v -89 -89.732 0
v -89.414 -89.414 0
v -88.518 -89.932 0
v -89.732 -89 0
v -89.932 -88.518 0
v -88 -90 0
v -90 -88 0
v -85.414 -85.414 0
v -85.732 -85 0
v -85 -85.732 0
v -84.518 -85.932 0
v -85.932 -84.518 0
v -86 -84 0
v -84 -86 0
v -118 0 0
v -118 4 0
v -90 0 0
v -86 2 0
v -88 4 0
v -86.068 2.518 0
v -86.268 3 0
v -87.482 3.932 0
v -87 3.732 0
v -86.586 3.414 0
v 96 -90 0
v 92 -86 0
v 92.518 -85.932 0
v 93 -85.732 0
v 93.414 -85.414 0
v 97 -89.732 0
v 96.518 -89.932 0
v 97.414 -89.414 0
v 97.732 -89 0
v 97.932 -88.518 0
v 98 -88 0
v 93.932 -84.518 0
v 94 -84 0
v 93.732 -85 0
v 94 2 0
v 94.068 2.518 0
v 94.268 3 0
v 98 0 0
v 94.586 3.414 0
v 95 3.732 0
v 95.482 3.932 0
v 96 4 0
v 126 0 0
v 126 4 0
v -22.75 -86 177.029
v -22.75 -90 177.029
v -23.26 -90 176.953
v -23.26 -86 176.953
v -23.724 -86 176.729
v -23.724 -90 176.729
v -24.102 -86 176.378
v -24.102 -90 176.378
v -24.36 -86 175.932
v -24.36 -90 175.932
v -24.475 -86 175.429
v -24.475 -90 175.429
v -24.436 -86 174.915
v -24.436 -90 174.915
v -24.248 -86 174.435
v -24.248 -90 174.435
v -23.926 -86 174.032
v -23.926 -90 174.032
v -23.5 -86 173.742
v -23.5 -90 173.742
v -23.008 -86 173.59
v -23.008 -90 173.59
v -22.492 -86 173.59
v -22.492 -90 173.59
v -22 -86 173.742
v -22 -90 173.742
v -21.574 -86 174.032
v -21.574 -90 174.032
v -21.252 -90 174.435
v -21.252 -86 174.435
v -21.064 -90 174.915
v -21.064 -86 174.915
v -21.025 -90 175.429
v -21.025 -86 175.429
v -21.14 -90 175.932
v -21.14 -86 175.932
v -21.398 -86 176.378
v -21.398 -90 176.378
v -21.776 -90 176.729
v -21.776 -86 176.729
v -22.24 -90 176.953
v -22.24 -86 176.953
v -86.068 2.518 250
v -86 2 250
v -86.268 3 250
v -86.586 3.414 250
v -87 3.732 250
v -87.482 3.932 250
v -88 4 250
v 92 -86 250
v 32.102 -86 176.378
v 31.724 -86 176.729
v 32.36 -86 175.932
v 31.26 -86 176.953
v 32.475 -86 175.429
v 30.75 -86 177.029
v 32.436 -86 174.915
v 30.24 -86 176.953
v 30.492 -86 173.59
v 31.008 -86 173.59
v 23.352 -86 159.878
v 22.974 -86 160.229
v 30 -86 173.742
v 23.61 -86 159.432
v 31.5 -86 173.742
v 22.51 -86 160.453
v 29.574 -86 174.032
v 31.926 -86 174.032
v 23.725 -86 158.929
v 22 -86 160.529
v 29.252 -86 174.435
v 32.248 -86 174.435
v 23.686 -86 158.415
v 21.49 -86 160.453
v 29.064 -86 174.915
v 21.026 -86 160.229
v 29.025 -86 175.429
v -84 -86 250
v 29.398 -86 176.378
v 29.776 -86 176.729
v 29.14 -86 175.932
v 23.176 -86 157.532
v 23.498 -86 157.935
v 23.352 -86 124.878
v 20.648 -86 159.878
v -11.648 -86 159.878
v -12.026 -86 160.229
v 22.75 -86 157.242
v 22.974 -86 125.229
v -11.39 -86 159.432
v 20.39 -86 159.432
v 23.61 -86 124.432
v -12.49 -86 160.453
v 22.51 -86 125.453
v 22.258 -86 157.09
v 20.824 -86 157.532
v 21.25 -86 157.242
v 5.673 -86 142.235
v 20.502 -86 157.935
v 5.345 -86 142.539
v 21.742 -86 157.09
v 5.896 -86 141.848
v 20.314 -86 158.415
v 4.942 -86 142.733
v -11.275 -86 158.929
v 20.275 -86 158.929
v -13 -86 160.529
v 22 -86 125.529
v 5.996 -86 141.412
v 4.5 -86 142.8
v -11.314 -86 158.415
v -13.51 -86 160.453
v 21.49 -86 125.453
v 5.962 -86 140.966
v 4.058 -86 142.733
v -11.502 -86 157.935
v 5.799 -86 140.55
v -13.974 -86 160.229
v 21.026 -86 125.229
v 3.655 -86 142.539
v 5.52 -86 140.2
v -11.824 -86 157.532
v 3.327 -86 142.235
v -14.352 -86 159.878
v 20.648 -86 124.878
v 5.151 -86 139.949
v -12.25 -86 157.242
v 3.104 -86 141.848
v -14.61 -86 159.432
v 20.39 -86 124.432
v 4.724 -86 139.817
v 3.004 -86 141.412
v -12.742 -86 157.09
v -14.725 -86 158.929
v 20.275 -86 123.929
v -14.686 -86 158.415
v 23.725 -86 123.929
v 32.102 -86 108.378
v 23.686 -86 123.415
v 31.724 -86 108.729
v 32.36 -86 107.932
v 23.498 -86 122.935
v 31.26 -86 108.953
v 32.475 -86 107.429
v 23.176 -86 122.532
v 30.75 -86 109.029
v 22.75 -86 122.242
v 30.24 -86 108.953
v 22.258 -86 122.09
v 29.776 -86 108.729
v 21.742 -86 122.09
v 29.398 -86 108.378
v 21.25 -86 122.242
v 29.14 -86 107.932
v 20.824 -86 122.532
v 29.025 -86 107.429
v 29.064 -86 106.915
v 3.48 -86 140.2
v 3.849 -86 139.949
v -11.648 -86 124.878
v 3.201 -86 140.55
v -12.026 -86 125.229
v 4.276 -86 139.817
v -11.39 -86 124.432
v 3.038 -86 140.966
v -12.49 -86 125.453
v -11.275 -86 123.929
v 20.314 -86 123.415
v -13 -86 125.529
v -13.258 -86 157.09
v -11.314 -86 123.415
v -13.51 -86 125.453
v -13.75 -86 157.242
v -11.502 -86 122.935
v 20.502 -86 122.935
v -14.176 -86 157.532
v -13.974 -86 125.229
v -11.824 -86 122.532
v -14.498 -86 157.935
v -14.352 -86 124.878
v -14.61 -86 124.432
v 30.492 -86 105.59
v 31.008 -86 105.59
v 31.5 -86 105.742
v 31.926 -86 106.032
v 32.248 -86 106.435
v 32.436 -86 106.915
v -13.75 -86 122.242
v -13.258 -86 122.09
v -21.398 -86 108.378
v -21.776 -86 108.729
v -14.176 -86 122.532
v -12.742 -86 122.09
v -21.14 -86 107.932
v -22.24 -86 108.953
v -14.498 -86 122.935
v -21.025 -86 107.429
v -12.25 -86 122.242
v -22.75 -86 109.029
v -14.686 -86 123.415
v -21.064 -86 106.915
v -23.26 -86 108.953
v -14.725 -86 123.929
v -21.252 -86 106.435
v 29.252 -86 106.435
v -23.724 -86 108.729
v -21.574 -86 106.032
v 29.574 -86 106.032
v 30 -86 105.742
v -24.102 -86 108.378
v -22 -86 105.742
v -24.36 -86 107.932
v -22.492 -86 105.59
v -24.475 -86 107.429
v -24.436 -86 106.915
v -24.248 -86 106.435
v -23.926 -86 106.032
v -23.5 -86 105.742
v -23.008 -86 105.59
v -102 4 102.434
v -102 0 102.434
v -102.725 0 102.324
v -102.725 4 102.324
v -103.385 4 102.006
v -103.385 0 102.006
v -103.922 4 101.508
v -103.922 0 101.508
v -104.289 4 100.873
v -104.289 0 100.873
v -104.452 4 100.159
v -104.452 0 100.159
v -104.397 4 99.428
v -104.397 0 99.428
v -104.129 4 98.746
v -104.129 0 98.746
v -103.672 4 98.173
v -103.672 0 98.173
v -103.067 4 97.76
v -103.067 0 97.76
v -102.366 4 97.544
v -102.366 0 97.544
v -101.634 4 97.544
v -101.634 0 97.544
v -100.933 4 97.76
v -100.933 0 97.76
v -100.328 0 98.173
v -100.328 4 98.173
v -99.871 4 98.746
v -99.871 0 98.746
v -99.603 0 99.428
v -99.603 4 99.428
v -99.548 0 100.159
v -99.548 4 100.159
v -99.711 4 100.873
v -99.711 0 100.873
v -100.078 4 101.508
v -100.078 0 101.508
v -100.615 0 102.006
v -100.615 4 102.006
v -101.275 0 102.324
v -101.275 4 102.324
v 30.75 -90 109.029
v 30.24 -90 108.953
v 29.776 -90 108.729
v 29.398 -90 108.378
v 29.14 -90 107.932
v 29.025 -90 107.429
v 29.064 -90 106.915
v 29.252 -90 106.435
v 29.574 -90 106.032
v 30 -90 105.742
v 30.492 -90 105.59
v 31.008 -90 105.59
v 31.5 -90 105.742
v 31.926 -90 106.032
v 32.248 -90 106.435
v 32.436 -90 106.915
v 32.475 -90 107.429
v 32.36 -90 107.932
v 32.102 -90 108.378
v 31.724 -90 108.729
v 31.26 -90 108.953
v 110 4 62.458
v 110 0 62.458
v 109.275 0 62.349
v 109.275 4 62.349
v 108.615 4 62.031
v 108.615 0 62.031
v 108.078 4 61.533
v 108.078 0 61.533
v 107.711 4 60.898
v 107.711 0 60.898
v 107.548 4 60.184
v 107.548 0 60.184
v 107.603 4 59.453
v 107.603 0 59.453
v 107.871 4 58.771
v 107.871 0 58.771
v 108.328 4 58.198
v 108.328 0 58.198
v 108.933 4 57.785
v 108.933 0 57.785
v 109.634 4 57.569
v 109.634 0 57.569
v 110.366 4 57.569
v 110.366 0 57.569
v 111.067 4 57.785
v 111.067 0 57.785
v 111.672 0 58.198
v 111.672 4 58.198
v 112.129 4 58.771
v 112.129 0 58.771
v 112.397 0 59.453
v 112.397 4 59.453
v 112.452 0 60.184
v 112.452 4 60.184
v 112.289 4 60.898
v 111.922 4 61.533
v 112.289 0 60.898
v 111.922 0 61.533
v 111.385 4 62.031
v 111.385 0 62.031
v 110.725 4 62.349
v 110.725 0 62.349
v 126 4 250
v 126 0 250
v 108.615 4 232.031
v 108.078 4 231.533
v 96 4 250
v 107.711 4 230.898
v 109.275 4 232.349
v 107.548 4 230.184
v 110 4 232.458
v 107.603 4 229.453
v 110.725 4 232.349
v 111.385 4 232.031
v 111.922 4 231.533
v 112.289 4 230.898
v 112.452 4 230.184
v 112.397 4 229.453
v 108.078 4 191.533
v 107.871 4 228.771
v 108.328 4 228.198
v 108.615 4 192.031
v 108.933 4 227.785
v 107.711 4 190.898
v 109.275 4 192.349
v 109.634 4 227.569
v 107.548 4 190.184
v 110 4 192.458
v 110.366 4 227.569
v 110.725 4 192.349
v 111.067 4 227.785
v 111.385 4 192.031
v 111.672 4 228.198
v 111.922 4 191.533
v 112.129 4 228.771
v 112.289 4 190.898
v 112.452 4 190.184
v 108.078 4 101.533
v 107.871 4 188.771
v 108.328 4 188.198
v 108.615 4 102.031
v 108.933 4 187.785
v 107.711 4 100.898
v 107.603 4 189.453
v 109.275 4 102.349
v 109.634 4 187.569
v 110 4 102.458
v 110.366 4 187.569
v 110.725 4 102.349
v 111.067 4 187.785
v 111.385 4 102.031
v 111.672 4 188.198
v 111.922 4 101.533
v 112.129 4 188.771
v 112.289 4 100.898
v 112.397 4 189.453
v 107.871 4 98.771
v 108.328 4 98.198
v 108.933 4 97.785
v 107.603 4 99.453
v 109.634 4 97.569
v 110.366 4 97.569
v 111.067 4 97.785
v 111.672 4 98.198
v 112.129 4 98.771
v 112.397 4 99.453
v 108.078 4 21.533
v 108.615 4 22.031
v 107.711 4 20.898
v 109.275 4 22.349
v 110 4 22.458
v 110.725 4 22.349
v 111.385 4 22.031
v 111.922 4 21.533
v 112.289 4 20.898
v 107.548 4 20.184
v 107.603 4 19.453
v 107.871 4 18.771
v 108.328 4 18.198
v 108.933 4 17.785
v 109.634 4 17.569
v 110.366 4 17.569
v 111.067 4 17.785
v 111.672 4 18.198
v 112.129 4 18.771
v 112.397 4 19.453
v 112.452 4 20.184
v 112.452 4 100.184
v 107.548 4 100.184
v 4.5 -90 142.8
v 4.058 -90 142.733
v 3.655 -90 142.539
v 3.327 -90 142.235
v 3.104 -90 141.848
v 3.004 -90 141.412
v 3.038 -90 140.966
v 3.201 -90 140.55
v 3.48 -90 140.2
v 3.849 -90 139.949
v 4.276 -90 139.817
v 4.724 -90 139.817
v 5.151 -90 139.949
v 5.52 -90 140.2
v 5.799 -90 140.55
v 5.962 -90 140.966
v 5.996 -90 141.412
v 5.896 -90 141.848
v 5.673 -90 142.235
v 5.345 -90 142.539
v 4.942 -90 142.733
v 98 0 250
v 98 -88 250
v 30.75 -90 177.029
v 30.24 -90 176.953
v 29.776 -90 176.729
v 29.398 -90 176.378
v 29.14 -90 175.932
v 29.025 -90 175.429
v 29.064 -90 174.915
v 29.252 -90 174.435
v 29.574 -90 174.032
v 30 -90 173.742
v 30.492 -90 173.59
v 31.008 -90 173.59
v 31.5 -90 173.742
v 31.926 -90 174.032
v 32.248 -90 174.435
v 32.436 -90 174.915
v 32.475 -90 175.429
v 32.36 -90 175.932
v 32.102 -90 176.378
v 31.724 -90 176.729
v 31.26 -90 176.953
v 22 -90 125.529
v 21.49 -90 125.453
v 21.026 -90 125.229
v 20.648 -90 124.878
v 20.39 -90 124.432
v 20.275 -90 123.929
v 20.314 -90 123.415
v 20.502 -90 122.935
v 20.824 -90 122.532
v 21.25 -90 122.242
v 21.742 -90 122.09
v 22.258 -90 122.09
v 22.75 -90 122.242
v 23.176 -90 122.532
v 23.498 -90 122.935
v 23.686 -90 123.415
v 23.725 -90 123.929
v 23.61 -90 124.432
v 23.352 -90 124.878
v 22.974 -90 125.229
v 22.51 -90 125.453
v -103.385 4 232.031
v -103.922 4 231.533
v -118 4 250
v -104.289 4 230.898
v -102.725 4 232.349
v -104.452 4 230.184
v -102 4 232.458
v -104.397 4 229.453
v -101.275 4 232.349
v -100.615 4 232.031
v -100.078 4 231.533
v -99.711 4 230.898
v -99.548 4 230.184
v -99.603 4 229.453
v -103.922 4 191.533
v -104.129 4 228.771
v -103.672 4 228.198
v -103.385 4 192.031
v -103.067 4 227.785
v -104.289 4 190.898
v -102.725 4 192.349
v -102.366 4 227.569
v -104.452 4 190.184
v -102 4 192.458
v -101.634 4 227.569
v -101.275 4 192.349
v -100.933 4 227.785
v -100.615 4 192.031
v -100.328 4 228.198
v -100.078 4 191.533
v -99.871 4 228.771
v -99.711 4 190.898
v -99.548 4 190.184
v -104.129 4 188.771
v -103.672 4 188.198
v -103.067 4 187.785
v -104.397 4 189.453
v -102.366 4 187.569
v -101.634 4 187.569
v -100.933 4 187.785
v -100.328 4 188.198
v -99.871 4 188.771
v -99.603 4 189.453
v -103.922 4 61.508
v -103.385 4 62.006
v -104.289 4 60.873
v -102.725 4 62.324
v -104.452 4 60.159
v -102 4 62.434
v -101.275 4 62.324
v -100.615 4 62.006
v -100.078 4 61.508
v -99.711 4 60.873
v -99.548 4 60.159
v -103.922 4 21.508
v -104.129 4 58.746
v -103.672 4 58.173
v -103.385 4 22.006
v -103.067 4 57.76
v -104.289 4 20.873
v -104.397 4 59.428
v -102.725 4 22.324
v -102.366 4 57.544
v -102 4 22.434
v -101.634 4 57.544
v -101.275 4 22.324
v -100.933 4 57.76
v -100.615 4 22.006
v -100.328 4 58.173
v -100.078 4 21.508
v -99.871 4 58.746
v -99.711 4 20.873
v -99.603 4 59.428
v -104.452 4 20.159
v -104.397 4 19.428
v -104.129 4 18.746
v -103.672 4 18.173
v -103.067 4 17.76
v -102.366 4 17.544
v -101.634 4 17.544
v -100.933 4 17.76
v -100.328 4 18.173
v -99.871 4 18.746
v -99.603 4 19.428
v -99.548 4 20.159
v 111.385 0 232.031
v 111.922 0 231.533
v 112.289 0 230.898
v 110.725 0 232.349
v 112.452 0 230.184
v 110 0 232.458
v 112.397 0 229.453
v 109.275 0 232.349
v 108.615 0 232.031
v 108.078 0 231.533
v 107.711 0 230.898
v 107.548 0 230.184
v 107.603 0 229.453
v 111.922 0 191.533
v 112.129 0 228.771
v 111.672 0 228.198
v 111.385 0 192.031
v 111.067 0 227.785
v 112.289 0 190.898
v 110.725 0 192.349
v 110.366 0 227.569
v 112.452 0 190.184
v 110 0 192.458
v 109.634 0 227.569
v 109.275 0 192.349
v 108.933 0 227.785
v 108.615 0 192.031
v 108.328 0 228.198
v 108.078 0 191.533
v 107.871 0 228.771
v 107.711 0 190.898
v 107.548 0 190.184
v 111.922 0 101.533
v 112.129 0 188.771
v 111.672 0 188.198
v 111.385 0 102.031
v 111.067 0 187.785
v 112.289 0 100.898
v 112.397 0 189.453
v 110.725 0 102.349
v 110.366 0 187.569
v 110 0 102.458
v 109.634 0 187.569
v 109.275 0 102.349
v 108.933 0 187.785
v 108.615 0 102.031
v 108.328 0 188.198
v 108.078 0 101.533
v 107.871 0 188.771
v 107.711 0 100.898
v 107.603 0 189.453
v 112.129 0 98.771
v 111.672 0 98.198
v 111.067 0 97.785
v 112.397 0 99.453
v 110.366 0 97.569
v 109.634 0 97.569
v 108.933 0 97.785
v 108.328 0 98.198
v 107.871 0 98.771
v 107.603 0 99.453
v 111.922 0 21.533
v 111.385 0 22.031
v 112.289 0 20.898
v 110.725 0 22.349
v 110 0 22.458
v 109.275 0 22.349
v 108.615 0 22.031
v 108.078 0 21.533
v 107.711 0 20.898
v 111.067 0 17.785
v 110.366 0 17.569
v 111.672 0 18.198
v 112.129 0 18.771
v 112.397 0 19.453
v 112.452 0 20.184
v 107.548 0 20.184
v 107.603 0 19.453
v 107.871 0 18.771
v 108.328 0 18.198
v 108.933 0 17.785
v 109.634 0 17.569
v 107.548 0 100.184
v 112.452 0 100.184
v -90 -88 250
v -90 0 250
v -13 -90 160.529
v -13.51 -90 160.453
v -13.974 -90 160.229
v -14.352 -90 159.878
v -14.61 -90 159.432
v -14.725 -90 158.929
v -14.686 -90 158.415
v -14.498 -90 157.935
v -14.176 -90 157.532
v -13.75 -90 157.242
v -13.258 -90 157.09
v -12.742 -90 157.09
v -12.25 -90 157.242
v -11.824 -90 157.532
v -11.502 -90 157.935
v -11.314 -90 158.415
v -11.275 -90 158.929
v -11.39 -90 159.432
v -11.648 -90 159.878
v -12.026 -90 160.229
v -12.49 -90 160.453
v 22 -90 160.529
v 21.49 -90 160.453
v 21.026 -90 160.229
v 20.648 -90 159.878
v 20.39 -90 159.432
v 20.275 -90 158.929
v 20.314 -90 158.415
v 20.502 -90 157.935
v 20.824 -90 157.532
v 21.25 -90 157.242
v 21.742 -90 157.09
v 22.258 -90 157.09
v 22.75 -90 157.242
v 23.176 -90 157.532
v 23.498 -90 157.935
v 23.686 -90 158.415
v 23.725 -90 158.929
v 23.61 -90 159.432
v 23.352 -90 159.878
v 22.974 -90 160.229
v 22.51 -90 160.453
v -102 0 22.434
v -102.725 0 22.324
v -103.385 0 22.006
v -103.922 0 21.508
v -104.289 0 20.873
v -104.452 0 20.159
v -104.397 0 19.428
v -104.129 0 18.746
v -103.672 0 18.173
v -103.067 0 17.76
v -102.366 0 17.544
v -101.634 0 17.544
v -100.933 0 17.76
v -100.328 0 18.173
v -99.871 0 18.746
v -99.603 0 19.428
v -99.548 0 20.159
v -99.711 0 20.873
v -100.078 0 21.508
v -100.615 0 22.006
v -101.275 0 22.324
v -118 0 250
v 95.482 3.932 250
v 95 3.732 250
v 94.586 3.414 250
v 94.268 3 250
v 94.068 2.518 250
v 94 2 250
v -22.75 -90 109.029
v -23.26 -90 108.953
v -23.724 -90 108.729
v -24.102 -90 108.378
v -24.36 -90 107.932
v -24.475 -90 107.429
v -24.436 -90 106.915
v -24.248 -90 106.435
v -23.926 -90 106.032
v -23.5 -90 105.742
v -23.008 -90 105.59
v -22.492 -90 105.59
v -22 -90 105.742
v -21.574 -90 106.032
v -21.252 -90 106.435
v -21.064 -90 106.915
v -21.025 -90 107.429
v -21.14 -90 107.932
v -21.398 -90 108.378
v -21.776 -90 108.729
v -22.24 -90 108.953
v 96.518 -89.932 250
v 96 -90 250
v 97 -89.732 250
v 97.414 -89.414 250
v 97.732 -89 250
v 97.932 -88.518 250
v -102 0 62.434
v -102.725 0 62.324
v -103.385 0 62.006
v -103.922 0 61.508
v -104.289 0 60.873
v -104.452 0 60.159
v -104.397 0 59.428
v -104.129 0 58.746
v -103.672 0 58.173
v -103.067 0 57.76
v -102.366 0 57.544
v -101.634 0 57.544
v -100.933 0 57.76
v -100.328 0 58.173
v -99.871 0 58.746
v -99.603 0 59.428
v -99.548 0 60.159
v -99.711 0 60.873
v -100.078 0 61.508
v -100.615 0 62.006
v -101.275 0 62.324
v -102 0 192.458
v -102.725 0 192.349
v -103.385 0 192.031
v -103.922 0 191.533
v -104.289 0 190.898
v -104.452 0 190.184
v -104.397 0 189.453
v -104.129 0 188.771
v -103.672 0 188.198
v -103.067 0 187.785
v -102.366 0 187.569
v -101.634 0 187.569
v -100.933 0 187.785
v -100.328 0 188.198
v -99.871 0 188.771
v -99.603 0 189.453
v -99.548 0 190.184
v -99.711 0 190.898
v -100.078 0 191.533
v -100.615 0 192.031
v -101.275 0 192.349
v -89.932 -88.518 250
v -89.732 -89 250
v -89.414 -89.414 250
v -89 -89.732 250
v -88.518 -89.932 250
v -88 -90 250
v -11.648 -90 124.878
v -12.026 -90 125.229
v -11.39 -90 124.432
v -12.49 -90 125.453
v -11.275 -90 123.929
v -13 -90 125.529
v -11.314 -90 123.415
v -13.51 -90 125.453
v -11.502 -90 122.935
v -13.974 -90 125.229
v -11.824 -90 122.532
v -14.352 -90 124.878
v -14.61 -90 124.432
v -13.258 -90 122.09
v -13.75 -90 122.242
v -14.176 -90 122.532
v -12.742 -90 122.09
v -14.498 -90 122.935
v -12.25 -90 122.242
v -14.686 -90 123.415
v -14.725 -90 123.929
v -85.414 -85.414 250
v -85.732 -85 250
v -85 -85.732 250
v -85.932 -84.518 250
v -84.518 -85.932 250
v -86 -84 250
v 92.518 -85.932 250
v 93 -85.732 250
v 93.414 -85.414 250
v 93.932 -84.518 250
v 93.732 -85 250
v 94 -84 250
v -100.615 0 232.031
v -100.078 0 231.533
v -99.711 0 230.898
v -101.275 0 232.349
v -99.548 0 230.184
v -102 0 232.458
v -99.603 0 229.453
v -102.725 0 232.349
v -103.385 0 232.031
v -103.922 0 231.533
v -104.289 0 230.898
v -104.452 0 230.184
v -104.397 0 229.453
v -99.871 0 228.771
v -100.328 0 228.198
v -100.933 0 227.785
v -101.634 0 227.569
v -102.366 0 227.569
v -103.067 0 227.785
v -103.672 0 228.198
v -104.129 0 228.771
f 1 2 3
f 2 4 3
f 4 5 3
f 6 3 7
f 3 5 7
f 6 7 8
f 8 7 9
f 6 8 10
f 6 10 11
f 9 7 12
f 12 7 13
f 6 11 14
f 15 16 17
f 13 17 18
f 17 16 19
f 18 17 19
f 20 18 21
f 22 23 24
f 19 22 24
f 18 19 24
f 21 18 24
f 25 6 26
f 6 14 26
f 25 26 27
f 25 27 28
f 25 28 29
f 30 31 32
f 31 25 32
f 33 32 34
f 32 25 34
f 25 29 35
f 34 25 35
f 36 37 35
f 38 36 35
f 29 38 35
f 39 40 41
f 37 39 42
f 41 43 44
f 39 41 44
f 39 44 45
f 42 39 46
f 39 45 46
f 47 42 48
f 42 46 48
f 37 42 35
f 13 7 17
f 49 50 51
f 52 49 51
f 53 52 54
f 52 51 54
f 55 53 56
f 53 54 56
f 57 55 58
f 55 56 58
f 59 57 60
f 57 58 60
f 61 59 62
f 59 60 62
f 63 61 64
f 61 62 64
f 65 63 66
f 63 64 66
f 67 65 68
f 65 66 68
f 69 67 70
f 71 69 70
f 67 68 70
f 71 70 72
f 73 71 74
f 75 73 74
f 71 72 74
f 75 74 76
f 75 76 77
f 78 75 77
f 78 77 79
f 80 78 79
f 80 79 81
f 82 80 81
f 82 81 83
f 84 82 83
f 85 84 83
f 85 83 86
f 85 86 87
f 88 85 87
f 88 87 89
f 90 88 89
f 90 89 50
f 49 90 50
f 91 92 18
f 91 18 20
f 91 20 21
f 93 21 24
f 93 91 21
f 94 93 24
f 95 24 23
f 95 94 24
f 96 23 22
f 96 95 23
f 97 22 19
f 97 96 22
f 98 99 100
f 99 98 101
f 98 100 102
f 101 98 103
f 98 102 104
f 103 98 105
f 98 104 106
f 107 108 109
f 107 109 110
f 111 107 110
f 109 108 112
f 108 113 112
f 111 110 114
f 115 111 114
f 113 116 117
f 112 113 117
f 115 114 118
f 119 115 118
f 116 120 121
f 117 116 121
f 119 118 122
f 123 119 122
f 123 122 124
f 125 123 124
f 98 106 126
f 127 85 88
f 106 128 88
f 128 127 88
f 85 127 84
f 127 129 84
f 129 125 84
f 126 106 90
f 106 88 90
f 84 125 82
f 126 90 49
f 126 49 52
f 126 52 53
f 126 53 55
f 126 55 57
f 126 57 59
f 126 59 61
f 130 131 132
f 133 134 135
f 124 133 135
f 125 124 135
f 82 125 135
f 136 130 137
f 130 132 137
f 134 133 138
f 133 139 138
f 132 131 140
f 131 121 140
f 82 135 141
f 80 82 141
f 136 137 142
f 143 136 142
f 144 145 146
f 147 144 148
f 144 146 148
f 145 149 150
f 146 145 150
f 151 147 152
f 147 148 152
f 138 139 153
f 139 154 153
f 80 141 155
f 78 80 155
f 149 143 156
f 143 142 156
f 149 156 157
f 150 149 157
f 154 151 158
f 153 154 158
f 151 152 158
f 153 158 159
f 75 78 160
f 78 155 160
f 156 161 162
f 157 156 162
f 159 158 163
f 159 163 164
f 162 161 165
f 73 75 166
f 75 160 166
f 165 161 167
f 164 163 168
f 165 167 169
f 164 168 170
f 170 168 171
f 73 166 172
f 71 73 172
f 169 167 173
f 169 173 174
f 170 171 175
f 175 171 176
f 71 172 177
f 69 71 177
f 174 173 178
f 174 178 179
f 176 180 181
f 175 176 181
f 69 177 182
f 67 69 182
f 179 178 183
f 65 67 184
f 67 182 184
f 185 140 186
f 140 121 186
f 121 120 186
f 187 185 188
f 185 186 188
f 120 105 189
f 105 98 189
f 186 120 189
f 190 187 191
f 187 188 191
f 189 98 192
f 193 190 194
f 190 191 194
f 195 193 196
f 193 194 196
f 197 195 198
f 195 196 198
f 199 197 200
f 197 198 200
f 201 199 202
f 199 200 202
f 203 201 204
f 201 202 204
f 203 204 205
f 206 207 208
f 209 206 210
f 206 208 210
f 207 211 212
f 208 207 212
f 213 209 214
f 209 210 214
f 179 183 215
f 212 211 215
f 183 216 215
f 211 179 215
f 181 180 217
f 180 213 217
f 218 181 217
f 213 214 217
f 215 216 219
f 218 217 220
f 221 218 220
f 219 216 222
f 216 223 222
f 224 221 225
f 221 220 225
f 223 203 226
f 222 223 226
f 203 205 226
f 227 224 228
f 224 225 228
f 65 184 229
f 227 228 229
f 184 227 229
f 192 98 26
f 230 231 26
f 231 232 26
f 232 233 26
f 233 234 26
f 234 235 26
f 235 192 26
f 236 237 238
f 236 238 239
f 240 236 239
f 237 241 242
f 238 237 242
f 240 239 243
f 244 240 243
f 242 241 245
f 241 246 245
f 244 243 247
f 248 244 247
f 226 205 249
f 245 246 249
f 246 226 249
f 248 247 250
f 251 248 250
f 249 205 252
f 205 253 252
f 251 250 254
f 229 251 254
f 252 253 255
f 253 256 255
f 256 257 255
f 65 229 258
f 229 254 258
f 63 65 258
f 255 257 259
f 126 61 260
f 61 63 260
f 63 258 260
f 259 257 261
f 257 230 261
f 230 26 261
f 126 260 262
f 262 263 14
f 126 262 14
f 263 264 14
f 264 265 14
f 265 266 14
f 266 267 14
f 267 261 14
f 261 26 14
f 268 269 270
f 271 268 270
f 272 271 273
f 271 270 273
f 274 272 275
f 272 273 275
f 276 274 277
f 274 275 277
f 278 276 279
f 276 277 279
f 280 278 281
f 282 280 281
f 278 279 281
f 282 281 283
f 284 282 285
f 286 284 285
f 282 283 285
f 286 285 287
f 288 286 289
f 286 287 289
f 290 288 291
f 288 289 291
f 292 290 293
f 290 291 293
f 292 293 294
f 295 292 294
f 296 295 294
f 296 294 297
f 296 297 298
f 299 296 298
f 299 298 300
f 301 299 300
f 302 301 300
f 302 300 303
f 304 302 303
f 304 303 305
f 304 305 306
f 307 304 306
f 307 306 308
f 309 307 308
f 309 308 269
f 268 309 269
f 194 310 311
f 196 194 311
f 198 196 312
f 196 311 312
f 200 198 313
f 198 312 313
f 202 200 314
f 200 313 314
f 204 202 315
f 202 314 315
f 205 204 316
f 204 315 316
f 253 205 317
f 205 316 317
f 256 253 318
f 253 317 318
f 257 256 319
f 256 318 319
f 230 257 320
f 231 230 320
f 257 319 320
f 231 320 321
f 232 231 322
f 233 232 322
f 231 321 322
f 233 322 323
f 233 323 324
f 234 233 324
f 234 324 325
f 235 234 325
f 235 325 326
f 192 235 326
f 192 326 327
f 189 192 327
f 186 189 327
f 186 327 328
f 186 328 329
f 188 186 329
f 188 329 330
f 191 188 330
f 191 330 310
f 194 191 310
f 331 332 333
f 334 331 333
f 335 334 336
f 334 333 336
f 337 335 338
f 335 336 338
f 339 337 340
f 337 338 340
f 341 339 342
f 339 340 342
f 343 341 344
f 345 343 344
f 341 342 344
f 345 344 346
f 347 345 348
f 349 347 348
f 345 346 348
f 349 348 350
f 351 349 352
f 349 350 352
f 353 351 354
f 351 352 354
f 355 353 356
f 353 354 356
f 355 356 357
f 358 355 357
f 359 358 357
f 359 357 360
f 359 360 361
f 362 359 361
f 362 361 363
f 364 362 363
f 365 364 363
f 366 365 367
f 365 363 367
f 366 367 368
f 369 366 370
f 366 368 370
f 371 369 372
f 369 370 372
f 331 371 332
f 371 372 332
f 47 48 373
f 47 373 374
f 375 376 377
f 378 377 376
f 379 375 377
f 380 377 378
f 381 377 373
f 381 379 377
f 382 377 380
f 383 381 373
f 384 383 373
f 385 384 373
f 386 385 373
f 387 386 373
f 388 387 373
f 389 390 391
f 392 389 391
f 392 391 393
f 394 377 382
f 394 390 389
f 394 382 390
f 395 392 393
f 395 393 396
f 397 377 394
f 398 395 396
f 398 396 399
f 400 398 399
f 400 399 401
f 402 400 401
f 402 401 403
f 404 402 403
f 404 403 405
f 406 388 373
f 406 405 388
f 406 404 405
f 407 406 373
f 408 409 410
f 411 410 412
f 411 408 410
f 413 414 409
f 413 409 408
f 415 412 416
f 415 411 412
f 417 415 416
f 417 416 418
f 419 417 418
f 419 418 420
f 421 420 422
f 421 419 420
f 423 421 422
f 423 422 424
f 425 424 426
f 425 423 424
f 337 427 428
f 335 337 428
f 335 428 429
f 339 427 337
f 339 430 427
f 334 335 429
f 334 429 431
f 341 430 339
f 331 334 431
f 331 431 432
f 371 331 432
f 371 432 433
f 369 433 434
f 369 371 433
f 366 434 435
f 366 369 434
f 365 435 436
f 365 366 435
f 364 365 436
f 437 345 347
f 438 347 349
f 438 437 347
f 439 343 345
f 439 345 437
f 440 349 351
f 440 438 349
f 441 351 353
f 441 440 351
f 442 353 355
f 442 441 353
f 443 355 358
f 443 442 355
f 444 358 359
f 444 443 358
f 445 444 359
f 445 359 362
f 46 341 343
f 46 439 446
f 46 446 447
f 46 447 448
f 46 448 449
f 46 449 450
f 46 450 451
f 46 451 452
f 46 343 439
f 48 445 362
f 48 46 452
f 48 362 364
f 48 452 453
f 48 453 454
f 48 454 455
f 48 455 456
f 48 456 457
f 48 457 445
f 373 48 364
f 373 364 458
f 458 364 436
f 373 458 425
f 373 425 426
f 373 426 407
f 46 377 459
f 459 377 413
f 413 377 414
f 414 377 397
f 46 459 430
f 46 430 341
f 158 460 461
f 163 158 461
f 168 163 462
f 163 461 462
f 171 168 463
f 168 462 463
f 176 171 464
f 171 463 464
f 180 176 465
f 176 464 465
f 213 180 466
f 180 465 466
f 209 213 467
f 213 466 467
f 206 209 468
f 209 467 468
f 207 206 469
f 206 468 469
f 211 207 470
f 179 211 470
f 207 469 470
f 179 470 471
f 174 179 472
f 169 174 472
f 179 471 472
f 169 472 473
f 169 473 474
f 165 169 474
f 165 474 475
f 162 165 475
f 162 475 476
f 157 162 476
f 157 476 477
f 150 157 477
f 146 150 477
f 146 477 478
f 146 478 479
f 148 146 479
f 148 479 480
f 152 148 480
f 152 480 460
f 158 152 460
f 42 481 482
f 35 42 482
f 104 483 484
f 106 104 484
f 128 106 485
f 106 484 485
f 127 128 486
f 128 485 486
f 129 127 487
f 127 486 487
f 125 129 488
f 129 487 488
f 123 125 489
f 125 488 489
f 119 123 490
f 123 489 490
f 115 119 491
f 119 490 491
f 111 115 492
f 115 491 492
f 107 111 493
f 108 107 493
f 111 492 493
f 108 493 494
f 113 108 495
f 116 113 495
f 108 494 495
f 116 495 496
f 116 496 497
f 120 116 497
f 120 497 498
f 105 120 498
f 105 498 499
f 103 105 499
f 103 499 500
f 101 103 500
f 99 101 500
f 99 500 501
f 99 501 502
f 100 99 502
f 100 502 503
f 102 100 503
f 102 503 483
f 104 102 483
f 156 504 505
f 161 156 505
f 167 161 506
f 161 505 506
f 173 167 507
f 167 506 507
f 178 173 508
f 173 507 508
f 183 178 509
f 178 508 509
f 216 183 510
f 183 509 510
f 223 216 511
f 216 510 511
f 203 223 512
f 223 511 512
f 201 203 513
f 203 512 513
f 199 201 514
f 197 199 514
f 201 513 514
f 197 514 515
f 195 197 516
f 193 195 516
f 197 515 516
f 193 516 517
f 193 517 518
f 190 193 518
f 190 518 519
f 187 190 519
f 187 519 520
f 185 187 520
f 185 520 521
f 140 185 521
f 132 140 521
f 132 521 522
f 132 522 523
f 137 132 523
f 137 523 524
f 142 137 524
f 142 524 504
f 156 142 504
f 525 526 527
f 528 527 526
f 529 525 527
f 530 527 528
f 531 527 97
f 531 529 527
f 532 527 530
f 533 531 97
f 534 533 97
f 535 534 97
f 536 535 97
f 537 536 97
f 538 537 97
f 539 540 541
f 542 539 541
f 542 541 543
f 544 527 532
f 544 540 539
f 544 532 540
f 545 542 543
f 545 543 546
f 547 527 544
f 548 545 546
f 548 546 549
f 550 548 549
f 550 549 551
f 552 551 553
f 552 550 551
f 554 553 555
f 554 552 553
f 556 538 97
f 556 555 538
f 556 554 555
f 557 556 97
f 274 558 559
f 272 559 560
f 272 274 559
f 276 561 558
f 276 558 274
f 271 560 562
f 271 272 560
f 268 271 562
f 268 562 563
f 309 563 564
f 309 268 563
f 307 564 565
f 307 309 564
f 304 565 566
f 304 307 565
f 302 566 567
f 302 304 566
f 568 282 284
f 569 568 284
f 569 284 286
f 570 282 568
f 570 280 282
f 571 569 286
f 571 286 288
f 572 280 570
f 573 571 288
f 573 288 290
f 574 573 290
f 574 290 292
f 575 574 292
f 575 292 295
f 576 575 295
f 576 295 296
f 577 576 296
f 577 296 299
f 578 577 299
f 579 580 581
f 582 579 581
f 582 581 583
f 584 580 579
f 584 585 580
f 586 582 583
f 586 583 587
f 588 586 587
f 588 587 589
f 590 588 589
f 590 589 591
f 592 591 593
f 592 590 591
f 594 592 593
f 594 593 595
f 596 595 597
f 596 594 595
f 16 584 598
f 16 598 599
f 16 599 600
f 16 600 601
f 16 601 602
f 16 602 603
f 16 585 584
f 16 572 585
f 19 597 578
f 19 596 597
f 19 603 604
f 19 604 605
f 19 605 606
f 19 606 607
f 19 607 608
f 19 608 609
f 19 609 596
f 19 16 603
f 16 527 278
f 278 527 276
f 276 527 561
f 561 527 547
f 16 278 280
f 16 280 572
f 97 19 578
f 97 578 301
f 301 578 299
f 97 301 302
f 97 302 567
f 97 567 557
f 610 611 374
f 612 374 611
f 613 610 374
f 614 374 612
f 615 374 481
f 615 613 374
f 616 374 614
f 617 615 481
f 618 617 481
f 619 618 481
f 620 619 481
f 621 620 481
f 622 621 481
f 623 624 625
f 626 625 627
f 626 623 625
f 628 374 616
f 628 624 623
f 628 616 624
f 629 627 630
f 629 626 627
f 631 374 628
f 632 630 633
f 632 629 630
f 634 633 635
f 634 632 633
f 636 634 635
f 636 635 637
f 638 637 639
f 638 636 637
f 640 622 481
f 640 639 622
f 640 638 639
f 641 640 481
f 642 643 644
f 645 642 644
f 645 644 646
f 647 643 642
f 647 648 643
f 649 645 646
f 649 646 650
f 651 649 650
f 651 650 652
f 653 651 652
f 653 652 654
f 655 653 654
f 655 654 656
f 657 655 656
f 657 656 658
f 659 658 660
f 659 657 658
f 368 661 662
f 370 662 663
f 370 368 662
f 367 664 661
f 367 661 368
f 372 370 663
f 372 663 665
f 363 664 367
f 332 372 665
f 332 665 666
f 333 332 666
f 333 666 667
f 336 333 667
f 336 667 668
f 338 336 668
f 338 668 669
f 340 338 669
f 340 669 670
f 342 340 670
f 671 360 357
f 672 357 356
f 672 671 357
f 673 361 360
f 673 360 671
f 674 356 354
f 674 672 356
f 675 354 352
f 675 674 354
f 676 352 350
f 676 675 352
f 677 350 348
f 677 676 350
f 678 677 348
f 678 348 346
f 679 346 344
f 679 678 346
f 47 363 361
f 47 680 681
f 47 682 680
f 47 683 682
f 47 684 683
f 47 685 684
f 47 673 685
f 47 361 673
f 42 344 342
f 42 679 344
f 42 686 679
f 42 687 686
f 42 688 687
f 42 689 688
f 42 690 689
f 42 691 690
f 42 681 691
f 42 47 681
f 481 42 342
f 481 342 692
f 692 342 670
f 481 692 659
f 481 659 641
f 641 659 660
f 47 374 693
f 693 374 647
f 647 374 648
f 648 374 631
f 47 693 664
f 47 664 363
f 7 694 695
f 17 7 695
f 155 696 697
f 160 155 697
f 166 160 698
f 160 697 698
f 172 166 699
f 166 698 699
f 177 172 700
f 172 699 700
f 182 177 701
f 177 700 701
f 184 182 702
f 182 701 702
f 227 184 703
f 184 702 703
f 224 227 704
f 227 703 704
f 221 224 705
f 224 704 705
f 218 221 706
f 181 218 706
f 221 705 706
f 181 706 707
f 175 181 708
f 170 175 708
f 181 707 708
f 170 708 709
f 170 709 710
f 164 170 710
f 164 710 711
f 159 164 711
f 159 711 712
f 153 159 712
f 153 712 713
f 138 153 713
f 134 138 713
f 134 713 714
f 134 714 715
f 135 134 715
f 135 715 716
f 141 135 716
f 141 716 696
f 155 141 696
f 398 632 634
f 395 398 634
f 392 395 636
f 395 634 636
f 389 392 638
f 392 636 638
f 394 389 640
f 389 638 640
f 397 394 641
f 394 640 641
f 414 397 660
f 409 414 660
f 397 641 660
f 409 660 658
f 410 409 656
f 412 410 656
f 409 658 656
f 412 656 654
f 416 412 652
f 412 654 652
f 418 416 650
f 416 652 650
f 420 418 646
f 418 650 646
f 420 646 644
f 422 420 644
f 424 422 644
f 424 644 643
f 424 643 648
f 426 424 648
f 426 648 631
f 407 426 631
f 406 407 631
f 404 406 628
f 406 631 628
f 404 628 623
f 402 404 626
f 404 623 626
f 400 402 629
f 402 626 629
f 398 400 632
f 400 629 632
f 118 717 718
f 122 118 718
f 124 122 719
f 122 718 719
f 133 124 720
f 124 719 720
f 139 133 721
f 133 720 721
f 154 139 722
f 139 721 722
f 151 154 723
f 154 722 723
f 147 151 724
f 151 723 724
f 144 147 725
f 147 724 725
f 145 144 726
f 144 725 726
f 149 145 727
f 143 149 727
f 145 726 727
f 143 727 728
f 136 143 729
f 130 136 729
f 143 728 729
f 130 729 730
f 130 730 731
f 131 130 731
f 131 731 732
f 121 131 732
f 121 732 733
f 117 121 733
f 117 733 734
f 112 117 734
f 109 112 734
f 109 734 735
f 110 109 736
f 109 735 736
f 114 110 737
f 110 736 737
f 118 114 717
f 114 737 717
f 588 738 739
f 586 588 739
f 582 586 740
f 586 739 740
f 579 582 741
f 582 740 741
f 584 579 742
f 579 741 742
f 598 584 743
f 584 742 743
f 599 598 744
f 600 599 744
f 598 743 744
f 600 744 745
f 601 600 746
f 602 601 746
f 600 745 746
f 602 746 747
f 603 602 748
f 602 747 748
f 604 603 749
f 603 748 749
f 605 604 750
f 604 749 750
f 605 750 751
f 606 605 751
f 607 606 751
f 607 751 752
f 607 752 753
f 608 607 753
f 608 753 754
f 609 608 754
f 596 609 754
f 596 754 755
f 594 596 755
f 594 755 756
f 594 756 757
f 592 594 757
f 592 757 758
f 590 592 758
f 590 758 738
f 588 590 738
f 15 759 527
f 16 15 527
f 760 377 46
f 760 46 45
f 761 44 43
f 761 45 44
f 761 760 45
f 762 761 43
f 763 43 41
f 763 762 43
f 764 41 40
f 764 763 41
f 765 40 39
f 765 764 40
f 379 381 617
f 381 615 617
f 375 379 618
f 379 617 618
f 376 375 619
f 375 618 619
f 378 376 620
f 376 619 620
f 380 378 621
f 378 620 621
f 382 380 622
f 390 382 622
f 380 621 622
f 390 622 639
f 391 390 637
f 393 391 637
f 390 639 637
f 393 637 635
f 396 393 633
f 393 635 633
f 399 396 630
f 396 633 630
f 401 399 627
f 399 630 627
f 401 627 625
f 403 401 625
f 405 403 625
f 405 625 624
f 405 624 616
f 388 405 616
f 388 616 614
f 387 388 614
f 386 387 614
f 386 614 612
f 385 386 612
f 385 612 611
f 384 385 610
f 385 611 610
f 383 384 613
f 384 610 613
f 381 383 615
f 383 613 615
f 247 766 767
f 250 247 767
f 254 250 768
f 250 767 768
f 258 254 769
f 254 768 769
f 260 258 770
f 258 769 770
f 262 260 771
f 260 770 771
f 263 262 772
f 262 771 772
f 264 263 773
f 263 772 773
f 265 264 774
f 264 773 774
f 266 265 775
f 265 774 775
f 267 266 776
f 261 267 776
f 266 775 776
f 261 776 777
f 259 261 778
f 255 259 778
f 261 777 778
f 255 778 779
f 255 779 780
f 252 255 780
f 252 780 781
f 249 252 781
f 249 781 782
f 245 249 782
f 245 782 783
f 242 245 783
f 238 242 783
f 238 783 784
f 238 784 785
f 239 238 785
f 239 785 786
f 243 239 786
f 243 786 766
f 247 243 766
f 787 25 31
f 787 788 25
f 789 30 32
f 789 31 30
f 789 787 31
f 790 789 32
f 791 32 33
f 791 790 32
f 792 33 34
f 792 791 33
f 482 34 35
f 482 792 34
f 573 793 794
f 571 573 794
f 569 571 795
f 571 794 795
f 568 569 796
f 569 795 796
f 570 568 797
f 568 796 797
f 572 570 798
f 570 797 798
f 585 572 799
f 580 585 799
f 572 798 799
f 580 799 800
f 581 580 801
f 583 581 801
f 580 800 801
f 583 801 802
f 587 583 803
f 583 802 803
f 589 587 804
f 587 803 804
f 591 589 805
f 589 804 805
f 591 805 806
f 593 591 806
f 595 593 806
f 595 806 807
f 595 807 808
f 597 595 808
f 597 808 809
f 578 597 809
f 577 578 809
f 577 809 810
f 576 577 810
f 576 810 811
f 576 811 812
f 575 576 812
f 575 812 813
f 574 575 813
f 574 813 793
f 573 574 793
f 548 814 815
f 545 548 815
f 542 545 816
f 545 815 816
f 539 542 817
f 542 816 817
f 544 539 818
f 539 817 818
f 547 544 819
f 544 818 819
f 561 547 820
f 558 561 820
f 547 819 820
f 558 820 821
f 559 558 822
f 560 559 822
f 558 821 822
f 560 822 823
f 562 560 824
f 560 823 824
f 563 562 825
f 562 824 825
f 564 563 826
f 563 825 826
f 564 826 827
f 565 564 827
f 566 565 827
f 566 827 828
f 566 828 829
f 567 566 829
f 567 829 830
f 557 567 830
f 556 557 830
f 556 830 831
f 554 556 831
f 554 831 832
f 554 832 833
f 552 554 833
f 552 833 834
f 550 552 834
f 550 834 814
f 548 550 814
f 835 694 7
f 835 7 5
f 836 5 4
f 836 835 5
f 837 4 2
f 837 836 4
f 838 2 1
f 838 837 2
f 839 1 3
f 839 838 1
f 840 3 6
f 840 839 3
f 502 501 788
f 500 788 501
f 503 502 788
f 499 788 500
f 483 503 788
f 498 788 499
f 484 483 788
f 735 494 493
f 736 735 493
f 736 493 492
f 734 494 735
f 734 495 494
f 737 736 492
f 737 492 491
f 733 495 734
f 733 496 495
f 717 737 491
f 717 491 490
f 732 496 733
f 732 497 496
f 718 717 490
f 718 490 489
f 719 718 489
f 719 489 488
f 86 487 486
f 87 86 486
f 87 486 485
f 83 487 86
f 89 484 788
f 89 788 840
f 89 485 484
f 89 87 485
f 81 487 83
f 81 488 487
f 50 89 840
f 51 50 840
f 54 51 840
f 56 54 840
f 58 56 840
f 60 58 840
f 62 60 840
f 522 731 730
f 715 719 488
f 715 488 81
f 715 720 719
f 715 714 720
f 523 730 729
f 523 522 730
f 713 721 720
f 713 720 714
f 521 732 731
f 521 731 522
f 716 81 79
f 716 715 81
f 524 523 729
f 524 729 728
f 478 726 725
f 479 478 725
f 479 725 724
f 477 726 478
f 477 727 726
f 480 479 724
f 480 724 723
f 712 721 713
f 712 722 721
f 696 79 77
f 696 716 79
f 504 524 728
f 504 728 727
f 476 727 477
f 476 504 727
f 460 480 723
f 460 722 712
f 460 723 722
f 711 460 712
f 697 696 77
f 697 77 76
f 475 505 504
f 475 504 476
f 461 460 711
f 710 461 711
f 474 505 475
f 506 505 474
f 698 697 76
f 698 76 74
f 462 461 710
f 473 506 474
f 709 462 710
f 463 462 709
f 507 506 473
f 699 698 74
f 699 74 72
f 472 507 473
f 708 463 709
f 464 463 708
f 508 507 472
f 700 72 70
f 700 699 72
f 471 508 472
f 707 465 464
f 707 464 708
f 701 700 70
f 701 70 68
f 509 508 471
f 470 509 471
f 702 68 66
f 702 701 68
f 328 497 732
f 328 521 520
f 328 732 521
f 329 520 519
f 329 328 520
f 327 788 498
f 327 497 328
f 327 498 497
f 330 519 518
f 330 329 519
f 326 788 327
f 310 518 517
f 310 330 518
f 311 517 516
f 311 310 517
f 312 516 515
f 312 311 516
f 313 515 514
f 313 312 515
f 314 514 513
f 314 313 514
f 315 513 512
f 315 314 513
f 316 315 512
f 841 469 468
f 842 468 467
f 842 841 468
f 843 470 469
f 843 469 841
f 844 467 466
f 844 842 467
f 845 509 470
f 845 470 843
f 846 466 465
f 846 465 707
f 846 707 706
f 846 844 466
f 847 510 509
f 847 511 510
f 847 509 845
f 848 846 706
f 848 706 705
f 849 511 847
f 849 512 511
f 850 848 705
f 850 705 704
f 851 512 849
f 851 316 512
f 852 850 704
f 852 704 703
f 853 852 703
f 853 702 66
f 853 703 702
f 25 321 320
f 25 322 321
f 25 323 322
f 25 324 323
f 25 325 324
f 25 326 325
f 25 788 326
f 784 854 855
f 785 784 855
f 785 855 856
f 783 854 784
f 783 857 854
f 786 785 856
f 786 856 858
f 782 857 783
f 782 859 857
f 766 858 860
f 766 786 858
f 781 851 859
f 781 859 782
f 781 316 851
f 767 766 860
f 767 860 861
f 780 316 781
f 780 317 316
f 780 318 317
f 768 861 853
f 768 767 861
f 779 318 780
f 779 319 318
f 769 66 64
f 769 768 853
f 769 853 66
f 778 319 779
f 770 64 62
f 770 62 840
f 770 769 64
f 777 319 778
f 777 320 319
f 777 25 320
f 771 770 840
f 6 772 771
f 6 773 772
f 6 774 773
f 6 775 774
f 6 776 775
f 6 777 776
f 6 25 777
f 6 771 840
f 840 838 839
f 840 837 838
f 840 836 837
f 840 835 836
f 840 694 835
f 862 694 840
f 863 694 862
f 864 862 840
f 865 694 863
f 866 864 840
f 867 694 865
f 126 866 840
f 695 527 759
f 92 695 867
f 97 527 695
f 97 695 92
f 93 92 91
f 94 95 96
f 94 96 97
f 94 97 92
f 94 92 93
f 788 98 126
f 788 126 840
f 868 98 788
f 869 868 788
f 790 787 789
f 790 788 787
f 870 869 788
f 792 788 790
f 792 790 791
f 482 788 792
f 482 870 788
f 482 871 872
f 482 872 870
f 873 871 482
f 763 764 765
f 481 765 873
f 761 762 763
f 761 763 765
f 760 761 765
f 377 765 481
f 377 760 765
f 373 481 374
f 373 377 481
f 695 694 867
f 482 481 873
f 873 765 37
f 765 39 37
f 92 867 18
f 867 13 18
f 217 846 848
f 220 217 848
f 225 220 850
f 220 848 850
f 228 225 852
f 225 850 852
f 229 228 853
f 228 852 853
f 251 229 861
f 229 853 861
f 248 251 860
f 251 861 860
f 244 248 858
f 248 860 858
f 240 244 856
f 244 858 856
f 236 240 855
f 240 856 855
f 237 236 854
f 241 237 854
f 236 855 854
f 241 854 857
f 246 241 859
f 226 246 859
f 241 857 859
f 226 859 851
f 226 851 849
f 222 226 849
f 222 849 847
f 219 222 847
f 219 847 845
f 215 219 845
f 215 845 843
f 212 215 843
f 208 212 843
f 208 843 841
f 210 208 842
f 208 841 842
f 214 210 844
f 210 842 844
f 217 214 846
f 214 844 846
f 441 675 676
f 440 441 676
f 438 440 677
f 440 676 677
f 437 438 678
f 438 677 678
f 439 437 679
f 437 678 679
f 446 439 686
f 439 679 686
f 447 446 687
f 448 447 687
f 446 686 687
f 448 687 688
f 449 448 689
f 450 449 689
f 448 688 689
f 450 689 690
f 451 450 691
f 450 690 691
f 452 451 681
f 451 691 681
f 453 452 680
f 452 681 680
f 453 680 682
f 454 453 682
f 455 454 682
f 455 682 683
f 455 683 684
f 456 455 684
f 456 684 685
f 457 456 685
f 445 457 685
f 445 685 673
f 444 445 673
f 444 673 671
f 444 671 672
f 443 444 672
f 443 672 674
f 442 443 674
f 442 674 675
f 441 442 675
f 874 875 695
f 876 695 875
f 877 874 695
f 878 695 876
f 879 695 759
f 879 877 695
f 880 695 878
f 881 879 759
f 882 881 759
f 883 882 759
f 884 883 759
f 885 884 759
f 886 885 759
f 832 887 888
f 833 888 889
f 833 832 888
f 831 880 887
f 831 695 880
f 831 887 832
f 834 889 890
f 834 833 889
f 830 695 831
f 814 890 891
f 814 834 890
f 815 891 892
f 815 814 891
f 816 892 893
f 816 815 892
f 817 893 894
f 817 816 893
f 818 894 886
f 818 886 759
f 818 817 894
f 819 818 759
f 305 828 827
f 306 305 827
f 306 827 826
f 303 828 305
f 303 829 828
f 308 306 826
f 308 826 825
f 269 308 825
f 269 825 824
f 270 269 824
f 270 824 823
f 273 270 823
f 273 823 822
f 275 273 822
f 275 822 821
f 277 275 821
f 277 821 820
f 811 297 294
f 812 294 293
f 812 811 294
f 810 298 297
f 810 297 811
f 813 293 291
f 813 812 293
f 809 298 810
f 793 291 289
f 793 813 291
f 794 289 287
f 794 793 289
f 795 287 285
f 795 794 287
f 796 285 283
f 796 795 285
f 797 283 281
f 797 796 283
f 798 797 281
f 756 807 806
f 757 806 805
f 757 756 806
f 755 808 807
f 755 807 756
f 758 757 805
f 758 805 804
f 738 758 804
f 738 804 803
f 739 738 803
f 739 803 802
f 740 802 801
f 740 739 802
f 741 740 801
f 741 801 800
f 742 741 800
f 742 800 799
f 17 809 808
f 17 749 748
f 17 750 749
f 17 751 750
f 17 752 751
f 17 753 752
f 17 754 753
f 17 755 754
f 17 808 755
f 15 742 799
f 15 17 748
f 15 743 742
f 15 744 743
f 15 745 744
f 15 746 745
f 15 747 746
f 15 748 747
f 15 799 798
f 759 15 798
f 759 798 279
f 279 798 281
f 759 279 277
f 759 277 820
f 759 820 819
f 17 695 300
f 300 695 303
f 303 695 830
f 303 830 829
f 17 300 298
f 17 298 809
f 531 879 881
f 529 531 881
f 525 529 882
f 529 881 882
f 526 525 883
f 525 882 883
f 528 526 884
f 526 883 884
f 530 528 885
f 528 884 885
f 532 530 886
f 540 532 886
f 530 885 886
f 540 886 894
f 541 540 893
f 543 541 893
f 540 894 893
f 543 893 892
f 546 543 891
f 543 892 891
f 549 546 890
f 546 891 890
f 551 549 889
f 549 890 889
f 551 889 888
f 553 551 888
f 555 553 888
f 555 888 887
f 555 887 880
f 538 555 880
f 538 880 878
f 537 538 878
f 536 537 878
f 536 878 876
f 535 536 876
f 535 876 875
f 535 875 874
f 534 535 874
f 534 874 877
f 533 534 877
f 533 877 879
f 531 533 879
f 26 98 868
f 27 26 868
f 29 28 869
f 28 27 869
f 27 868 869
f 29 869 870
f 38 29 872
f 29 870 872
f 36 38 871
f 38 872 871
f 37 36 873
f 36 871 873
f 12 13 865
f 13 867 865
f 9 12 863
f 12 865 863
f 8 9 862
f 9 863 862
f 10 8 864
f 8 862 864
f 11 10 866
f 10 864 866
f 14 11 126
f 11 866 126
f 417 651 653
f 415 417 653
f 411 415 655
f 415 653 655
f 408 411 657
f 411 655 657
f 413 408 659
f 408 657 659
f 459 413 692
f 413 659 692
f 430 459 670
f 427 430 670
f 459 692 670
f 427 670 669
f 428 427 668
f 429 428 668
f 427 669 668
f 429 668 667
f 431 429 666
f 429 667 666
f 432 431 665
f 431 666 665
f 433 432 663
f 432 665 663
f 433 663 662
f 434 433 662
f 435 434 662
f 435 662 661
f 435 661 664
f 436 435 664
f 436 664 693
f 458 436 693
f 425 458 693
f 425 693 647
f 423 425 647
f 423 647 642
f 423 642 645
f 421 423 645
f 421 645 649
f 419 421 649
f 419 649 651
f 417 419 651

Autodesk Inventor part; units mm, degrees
ref_plane "YZ Plane" through (0, 0, 0) normal (1, 0, 0) x (0, 1, 0)
ref_plane "XZ Plane" through (0, 0, 0) normal (0, 1, 0) x (-1, 0, 0)
ref_plane "XY Plane" through (0, 0, 0) normal (0, 0, 1) x (1, 0, 0)
sketch "Sketch1" plane through (0, 0, 0) normal (0, 0, 1) x (1, 0, 0)
  line L0 (98, 0) -> (98, -90)
  line L1 (98, -90) -> (-90, -90)
  line L2 (-90, -90) -> (-90, 0)
  line L3 (126, 4) -> (126, 0)
  line L4 (126, 0) -> (-118, 0)
  line L5 (-118, 0) -> (-118, 4)
  line L6 (-86, 4) -> (94, 4)
  line L7 (94, 4) -> (94, -86)
  line L8 (94, -86) -> (-86, -86)
  line L9 (-86, -86) -> (-86, 4)
  line L10 (-90, 0) -> (-86, 0)
  line L11 (94, 0) -> (98, 0)
  line L12 (-118, 4) -> (-86, 4)
  line L13 (94, 4) -> (126, 4)
  point P0 (0, 0)
  point P1 (6, -4)
  point P2 (126, 2)
  point P3 (98, 0)
  dimension "d0" = 188
  dimension "d1" = 90
  dimension "d3" = 90
  dimension "d4" = 244
  dimension "d5" = 120
  dimension "d8" = 90
  dimension "d9" = 180
  dimension "d10" = 4
  dimension "d13" = 0
  dimension "d14" = 4
  dimension "d90" = 32
extrude "Extrusion1" add sketch "Sketch1" along normal blind 250 contours L4 L7 L13 L3 | L0 L1 L2 L4 L9 L8 L7 | L4 L5 L12 L9
fillet "Fillet1" radius 2 4 edges at (-86, -86, 125) (-86, 4, 125) (94, 4, 125) (98, -90, 125)
fillet "Fillet2" radius 2 2 edges at (-90, -90, 125) (94, -86, 125)
sketch "Sketch3" plane through (-84, -86, 250) normal (0, 1, 0) x (1, 0, 0)
  line L0 (-2, 0) -> (-2, 250) projected
  line L1 (176, 0) -> (0, 0) projected
  point P0 (84, 250)
  point P1 (114.75, 74.7)
  point P2 (61.25, 74.7)
  dimension "d28" = 53.5
  dimension "d29" = 63.25
  dimension "d30" = 0
  dimension "d31" = 74.7
hole "Hole2" at (30.75, -86, 175.3) at (-22.75, -86, 175.3) direction (0, -1, 0) diameter 3.4587 end through all thread size "M4x0.5" class "6H" standard "ISO Metric profile"
sketch "Sketch4" plane through (-84, -86, 250) normal (0, 1, 0) x (1, 0, 0)
  circle A0 centre (61.25, 74.7) radius 1.7294 projected
  circle A1 centre (114.75, 74.7) radius 1.7294 projected
  point P0 (84, 250)
  point P1 (114.75, 142.7)
  point P2 (61.25, 142.7)
  dimension "d39" = 53.5
  dimension "d40" = 68
  dimension "d41" = 68
  dimension "d49" = 0
hole "Hole3" at (30.75, -86, 107.3) at (-22.75, -86, 107.3) direction (0, -1, 0) diameter 3.4587 end through all thread size "M4x0.5" class "6H" standard "ISO Metric profile"
sketch "Sketch5" plane through (-84, -86, 250) normal (0, 1, 0) x (1, 0, 0)
  circle A0 centre (61.25, 74.7) radius 1.7294 projected
  circle A1 centre (114.75, 74.7) radius 1.7294 projected
  circle A2 centre (61.25, 142.7) radius 1.7294 projected
  point P0 (84, 250)
  point P1 (71, 91.2)
  point P2 (71, 126.2)
  point P3 (106, 126.2)
  point P4 (106, 91.2)
  dimension "d50" = 35
  dimension "d51" = 35
  dimension "d52" = 35
  dimension "d53" = 16.5
  dimension "d54" = 16.5
  dimension "d55" = 9.75
hole "Hole4" at (-13, -86, 158.8) at (-13, -86, 123.8) at (22, -86, 123.8) at (22, -86, 158.8) direction (0, -1, 0) diameter 3.4587 end through all thread size "M4x0.5" class "6H" standard "ISO Metric profile"
sketch "Sketch6" plane through (-84, -86, 250) normal (0, 1, 0) x (1, 0, 0)
  circle A0 centre (71, 126.2) radius 1.7294 projected
  point P0 (84, 250)
  point P1 (88.5, 108.7)
  dimension "d63" = 17.5
  dimension "d64" = 17.5
hole "Hole5" at (4.5, -86, 141.3) direction (0, -1, 0) diameter 3 end through all
sketch "Sketch7" plane through (126, 4, 250) normal (0, 1, 0) x (1, 0, 0)
  line L0 (-244, 250) -> (-244, 0) projected
  line L1 (-214, 0) -> (-244, 0) projected
  line L2 (-214, 250) -> (-244, 250) projected
  line L3 (0, 250) -> (0, 0) projected
  line L4 (0, 250) -> (-30, 250) projected
  line L5 (-28, 0) -> (0, 0) projected
  point P0 (-126, 250)
  point P1 (-228, 20)
  point P2 (-228, 60)
  point P3 (-228, 230.025)
  point P4 (-228, 190.025)
  point P5 (-228, 150.025)
  point P6 (-16, 230)
  point P7 (-16, 190)
  point P8 (-16, 150)
  point P9 (-16, 60)
  point P10 (-16, 20)
  point P11 (-229, 250)
  point P12 (-15, 250)
  dimension "d72" = 16
  dimension "d73" = 16
  dimension "d74" = 16
  dimension "d75" = 16
  dimension "d76" = 16
  dimension "d77" = 20
  dimension "d78" = 40
  dimension "d79" = 20
  dimension "d80" = 40
  dimension "d81" = 40
  dimension "d82" = 16
  dimension "d83" = 16
  dimension "d84" = 16
  dimension "d85" = 16
  dimension "d86" = 16
  dimension "d87" = 20
  dimension "d88" = 40
  dimension "d89" = 40
  dimension "d98" = 20
  dimension "d99" = 40
hole "Hole6" at (-102, 4, 230) at (-102, 4, 190) at (-102, 4, 19.975) at (-102, 4, 59.975) at (-102, 4, 99.975) at (110, 4, 20) at (110, 4, 60) at (110, 4, 100) at (110, 4, 190) at (110, 4, 230) direction (0, -1, 0) diameter 4.917 end through all thread size "M6x1" class "6H" standard "ISO Metric profile"
equation "\"BendRadius\" = Thickness"
equation "\"BendReliefWidth\" = Thickness"
equation "\"BendReliefDepth\" = 0.5 * Thickness"
equation "\"CornerReliefSize\" = 4 * Thickness"
equation "\"MinimumRemnant\" = 2 * Thickness"
equation "\"TransitionRadius\" = BendRadius"
equation "\"JacobiRadiusSize\" = BendRadius"
equation "\"GapSize\" = Thickness"
equation "\"Thickness\" = 0.5"
properties part number "Lower joint housing"
